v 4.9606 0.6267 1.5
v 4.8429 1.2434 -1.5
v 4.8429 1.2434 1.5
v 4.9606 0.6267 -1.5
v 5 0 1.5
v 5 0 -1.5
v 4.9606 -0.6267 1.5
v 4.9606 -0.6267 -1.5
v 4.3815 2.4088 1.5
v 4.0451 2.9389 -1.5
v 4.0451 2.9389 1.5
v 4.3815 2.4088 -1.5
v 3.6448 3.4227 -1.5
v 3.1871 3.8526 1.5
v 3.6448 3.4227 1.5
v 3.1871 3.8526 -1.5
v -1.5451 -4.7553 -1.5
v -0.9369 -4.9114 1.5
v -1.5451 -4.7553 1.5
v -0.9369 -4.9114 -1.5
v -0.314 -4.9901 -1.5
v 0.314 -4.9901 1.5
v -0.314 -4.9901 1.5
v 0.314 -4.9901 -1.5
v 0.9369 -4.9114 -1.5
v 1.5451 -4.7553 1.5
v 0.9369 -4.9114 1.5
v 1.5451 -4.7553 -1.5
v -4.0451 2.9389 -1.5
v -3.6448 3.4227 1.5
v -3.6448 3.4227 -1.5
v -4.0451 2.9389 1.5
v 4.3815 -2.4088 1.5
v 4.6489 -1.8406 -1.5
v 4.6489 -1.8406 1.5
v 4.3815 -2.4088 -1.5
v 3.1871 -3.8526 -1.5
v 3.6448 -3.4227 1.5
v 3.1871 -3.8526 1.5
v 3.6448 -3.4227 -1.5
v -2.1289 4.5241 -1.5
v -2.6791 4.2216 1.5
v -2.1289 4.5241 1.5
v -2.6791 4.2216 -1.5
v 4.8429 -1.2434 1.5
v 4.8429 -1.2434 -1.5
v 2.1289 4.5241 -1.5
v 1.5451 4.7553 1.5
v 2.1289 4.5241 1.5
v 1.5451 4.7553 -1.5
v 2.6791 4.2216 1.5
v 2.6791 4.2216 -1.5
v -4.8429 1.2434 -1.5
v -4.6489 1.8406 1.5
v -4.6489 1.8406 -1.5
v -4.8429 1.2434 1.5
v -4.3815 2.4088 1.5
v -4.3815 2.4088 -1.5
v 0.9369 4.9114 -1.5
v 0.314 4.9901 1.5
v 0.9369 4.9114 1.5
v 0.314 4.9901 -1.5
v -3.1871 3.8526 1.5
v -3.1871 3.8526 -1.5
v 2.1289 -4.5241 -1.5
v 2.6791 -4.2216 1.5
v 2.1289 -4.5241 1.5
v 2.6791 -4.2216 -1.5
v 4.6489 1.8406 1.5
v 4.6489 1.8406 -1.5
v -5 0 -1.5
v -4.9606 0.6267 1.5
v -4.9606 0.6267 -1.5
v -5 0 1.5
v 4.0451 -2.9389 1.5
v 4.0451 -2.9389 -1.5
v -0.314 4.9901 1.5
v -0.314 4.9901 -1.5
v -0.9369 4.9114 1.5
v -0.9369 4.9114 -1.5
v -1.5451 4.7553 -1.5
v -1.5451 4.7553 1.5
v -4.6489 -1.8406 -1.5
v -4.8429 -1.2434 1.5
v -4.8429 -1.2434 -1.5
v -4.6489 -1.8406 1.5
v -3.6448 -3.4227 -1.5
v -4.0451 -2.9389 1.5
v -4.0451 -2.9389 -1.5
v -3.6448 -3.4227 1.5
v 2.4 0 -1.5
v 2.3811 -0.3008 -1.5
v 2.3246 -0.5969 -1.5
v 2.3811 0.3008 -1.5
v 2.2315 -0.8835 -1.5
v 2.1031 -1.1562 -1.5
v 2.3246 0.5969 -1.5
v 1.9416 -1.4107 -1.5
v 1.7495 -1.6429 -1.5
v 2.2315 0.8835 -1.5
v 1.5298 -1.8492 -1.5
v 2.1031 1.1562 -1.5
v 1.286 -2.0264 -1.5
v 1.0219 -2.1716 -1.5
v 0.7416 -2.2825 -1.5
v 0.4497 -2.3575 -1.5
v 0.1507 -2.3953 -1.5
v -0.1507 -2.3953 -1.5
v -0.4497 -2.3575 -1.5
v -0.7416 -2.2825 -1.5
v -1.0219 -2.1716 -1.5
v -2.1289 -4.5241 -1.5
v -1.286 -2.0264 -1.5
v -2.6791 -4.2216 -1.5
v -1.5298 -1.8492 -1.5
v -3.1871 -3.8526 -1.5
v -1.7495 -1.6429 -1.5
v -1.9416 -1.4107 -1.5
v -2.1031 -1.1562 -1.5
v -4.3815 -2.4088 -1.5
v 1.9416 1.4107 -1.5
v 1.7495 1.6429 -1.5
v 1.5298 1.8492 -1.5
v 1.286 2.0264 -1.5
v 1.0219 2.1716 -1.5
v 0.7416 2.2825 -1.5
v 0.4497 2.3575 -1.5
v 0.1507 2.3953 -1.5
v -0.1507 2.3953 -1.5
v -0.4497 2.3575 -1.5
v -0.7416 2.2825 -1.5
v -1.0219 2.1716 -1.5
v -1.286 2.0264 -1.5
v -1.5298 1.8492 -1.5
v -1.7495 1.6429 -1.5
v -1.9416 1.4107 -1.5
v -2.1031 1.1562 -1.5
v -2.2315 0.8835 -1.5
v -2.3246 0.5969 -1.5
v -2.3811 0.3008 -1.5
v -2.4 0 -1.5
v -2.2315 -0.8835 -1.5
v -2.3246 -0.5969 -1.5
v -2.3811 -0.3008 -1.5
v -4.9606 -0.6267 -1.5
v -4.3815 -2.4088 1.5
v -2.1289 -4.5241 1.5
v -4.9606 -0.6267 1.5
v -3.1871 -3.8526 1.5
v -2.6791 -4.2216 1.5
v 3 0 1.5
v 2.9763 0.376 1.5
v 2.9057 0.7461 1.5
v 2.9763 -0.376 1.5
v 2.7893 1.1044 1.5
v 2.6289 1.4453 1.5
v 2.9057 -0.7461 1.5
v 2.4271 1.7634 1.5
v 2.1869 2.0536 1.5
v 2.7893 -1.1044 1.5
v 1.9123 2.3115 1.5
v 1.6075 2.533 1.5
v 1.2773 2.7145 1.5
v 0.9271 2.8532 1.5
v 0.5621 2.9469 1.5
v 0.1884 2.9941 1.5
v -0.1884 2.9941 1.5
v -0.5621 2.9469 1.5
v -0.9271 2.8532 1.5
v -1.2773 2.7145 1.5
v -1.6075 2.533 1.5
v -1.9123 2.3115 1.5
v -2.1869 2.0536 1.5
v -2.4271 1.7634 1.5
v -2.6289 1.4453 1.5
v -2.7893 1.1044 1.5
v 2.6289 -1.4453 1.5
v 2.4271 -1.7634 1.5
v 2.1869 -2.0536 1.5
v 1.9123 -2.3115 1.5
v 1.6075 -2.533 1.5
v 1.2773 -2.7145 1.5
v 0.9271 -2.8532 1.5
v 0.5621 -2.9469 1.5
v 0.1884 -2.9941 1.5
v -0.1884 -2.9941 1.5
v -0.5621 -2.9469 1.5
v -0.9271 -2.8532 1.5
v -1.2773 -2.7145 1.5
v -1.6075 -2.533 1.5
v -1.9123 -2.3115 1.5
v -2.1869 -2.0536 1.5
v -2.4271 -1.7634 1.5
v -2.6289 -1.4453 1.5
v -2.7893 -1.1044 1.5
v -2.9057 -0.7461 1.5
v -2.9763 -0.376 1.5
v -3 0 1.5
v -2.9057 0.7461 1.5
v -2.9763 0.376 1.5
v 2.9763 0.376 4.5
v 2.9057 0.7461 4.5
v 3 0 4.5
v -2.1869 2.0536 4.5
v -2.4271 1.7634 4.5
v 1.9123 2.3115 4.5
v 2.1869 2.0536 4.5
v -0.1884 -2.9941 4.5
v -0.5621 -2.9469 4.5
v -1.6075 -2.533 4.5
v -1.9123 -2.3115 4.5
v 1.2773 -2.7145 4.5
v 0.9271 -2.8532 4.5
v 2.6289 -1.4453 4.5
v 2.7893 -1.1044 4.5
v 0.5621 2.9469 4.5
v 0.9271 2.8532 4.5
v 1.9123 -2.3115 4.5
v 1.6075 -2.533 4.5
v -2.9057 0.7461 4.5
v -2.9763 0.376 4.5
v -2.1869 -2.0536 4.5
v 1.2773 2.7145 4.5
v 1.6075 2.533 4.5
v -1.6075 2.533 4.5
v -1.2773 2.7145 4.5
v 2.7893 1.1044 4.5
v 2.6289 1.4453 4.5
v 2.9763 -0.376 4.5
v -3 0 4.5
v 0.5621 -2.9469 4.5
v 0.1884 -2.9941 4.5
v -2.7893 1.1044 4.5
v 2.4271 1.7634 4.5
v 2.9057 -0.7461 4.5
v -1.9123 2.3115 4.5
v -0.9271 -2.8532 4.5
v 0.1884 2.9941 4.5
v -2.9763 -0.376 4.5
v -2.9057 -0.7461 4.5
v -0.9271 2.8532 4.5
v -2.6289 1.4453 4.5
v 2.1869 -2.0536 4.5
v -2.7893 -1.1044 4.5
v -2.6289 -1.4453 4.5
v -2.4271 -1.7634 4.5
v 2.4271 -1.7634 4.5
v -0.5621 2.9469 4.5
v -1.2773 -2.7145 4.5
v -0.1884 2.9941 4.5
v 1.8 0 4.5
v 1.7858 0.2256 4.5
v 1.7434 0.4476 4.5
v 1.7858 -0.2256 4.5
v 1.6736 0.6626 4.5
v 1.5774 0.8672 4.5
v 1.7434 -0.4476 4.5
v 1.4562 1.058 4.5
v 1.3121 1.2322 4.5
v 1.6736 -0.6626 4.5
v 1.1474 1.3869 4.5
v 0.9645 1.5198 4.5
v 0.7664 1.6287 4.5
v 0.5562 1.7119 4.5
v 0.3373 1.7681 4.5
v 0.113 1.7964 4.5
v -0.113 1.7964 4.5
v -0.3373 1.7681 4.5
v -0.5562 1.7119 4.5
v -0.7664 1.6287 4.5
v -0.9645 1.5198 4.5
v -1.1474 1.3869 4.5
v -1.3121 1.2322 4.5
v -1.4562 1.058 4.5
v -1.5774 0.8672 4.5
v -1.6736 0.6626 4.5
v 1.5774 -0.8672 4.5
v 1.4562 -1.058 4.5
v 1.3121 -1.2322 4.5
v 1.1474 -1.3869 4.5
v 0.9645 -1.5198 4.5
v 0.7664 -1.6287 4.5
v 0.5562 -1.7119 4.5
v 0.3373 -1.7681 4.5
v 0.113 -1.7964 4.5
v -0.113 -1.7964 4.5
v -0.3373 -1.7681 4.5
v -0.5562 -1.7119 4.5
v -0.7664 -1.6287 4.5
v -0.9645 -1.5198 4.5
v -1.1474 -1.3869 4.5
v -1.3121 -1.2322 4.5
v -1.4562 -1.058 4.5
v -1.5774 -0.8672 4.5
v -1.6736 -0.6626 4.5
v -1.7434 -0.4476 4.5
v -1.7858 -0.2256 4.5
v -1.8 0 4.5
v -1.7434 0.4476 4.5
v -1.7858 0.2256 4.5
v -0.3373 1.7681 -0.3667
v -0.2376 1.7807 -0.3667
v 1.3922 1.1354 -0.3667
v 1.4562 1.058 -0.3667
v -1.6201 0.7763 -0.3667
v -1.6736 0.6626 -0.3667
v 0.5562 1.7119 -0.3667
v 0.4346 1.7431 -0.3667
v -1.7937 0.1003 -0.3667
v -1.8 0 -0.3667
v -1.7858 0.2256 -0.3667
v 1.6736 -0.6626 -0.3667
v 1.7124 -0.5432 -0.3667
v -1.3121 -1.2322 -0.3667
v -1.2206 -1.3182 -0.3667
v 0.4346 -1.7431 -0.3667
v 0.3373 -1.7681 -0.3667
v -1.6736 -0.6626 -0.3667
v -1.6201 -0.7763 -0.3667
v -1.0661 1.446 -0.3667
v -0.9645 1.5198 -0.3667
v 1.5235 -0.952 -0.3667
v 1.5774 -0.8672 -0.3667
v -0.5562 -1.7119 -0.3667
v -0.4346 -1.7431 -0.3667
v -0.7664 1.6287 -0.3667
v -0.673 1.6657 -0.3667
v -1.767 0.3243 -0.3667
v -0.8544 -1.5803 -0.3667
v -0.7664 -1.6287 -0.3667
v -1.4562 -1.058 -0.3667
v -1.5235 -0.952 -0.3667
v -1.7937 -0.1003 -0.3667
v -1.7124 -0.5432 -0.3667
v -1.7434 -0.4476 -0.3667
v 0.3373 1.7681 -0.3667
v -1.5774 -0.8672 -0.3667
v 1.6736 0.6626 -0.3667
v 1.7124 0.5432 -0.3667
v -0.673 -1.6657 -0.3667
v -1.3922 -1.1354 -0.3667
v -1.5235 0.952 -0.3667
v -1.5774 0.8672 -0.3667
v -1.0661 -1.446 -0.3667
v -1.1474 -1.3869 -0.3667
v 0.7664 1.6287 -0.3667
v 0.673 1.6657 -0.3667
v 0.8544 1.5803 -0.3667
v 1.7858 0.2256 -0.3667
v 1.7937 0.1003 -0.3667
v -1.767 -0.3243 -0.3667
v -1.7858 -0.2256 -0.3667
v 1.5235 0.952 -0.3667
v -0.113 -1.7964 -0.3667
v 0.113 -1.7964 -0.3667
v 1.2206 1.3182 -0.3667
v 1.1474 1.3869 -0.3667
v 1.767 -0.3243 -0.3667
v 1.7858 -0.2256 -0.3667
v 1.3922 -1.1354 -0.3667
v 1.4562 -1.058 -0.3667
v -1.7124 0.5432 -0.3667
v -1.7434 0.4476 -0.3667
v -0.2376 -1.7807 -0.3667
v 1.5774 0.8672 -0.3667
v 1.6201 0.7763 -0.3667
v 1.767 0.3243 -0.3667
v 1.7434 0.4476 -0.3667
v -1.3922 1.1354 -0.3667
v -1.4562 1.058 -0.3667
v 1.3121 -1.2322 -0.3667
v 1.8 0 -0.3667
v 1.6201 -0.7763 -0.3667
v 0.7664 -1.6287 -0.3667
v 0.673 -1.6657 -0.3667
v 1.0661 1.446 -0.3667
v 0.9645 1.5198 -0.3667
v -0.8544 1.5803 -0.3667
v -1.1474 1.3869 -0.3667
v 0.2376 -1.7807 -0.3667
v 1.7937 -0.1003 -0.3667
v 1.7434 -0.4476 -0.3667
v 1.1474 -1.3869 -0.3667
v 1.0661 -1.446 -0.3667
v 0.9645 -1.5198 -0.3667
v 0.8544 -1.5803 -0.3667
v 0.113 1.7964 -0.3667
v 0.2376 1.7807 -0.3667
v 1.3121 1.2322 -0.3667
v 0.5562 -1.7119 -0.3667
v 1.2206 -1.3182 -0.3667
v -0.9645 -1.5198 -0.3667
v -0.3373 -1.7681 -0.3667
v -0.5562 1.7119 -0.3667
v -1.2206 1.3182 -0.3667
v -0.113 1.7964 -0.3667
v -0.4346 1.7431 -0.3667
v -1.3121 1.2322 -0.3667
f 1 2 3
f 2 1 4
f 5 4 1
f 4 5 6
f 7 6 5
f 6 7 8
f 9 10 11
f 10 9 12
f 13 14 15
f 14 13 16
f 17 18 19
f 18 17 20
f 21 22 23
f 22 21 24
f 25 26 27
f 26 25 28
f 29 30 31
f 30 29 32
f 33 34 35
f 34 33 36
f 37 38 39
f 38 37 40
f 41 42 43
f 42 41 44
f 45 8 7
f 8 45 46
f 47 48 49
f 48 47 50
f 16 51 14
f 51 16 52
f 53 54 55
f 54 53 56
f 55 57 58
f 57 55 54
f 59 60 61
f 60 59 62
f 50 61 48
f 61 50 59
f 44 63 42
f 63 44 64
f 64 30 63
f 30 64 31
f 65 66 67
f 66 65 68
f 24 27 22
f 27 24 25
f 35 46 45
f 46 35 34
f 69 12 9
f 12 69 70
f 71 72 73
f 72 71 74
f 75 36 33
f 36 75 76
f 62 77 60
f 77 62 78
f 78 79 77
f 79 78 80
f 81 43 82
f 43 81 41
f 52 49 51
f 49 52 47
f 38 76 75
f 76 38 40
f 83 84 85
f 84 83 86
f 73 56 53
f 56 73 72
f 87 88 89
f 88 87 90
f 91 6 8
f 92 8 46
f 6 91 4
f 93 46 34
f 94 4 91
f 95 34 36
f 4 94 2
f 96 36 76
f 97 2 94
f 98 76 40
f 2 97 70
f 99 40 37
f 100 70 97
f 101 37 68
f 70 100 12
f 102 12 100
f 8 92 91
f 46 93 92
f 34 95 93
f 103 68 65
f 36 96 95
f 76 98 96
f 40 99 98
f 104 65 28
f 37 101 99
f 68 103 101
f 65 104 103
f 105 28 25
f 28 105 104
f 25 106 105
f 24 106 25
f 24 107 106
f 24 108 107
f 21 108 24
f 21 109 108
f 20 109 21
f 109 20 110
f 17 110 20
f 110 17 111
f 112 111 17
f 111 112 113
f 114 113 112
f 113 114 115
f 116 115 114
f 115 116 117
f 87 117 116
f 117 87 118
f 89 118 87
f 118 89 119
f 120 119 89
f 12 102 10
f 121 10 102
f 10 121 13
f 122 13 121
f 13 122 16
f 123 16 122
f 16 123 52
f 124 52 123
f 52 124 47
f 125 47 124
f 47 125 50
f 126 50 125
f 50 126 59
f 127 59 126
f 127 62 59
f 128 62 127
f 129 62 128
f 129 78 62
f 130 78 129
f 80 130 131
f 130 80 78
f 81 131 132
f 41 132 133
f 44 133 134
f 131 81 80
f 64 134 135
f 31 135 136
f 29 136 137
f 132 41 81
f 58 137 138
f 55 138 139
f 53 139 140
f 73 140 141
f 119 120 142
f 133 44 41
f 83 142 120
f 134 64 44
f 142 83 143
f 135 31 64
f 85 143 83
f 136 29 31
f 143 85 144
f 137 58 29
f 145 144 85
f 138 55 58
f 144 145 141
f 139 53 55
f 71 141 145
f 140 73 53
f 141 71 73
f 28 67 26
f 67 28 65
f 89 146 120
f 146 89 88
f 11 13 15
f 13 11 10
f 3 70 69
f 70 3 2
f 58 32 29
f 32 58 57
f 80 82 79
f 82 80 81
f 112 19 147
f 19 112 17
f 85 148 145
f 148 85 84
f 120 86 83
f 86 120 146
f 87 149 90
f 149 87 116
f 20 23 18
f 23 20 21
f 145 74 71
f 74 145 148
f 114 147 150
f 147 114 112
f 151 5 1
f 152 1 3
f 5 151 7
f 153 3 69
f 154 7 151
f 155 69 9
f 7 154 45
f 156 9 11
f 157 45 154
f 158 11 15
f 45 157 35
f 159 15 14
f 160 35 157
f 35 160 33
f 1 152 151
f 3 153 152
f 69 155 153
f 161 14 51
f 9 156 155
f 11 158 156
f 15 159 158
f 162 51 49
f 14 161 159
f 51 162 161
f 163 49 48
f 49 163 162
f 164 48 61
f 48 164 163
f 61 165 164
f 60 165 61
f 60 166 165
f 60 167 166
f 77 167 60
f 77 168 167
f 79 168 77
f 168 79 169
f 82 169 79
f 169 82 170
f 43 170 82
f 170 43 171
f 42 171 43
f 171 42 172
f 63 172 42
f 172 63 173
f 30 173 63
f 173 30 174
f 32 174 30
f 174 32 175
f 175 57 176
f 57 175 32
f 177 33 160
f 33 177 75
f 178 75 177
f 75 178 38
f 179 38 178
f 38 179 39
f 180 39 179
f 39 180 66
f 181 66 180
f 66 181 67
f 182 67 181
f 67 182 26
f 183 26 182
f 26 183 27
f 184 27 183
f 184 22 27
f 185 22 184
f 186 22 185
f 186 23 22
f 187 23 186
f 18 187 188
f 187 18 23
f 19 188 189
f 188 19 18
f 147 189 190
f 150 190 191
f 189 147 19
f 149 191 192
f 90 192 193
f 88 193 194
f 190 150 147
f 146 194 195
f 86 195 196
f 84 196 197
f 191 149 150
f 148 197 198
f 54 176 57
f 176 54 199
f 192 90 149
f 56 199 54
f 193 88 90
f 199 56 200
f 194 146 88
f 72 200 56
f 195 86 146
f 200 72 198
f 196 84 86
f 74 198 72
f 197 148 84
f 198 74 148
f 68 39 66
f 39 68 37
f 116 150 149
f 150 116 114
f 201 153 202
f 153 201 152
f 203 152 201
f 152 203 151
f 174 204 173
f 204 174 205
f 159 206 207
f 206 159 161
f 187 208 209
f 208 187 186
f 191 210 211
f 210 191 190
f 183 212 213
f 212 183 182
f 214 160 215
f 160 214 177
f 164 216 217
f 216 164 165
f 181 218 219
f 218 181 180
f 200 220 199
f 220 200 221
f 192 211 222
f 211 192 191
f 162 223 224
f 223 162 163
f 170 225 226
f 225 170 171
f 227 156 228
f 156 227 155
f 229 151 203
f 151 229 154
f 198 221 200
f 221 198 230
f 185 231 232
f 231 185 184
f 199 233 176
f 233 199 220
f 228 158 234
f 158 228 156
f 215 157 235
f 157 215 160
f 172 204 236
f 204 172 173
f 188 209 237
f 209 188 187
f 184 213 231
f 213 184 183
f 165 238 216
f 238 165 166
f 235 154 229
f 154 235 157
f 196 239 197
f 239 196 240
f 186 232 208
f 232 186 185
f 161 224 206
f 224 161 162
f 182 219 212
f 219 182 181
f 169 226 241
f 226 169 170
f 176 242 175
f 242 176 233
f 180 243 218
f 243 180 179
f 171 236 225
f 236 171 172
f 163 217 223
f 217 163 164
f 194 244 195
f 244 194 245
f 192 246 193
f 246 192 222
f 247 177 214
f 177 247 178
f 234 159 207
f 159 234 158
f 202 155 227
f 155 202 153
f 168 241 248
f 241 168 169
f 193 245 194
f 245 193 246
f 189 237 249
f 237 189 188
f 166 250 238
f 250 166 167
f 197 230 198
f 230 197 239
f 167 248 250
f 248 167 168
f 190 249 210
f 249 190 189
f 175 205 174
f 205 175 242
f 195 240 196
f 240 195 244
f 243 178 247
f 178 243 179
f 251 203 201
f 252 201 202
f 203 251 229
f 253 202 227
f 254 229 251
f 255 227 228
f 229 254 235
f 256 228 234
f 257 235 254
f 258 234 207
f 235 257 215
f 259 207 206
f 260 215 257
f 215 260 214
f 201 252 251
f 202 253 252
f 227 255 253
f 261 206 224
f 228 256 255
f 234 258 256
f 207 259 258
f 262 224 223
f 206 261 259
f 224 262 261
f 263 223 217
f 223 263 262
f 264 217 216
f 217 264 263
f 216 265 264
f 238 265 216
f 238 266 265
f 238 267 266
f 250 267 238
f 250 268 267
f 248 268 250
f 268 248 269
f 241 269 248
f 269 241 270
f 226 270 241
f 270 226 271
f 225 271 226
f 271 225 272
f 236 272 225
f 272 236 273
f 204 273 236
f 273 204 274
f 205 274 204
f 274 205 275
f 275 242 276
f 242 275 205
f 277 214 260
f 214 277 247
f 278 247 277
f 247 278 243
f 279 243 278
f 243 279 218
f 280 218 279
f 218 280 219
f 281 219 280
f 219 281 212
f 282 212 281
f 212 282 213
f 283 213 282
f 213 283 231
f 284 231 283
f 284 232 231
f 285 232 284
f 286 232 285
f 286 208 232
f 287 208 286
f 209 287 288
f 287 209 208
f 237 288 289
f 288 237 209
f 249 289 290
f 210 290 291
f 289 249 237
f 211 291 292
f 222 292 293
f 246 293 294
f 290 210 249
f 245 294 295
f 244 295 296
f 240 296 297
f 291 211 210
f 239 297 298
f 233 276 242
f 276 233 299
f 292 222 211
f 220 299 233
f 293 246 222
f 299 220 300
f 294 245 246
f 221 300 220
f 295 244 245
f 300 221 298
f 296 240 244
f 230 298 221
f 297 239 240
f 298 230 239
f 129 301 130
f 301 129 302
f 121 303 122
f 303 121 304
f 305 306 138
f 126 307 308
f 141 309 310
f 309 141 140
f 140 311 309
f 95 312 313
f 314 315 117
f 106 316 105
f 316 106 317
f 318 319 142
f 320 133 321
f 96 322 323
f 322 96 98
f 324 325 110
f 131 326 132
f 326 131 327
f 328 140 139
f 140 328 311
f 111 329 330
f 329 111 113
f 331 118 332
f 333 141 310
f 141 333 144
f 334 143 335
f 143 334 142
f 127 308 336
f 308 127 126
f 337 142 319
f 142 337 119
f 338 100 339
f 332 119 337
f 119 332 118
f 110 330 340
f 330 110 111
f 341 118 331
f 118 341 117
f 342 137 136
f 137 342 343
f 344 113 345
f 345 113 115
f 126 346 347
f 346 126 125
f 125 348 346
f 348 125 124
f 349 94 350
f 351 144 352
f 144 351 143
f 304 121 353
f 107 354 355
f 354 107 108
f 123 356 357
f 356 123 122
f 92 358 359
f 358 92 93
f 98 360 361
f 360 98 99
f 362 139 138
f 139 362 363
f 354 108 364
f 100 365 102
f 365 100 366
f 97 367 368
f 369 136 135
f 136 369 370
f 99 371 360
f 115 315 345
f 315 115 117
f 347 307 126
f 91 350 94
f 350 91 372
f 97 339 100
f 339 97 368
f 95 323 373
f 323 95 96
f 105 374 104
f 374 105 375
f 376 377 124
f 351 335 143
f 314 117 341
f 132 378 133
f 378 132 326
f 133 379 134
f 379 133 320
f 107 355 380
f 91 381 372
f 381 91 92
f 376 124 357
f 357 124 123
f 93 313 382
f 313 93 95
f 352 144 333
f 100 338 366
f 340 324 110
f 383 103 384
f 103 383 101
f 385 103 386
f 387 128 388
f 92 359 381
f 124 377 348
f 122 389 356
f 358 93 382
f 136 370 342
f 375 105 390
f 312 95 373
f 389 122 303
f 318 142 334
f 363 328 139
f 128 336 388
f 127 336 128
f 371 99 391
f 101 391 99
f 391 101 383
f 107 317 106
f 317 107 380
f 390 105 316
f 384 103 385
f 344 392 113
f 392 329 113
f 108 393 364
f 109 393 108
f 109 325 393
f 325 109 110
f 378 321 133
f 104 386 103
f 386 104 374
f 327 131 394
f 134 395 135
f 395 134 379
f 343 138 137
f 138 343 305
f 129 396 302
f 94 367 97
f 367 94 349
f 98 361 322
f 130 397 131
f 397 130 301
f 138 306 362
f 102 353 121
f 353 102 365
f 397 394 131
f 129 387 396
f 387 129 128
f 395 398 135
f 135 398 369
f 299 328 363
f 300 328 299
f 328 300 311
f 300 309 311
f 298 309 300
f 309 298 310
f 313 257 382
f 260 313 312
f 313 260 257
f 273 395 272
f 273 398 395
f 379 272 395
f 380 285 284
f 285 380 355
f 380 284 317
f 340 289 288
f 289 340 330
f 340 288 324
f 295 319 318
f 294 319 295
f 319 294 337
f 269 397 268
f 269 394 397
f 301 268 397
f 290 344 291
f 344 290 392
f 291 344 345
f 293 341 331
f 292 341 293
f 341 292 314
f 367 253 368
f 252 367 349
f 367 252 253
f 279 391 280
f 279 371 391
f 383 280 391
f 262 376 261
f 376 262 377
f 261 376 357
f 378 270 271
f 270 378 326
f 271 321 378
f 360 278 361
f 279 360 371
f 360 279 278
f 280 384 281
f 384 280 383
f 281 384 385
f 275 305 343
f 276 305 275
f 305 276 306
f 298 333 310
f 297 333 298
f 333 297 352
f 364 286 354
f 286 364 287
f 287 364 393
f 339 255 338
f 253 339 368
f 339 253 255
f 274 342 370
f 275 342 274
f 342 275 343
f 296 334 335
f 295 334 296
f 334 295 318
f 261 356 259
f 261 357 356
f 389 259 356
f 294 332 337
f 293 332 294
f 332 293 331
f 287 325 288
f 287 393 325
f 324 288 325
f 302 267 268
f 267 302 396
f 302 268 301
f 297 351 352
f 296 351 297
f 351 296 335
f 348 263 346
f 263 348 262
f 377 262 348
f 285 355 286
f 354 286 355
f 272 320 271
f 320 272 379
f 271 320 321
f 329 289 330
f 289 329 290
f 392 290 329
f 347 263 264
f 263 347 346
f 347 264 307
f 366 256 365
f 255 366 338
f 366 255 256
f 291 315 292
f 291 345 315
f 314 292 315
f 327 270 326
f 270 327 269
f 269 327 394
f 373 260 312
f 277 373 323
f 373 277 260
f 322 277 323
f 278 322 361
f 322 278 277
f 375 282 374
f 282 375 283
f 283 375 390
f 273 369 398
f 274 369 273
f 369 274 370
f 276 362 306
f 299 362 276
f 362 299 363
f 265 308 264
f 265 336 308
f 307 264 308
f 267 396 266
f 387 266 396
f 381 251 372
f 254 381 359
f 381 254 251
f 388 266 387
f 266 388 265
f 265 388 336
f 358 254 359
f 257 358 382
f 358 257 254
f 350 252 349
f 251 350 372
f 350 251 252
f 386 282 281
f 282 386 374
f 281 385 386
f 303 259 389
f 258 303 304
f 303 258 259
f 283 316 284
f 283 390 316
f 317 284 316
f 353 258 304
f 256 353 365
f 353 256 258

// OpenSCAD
$fn = 50;


difference() {
	union() {
		translate(v = [0, 0, -1.5000000000]) {
			cylinder(h = 3, r = 5.0000000000);
		}
		translate(v = [0, 0, -1.5000000000]) {
			cylinder(h = 6, r = 3.0000000000);
		}
	}
	union() {
		translate(v = [0, 0, -1.5000000000]) {
			rotate(a = [0, 180, 0]) {
				difference() {
					union() {
						translate(v = [0, 0, -1.7000000000]) {
							cylinder(h = 1.7000000000, r1 = 1.5000000000, r2 = 2.4000000000);
						}
						translate(v = [0, 0, -6.0000000000]) {
							cylinder(h = 6, r = 1.5000000000);
						}
						translate(v = [0, 0, -6.0000000000]) {
							cylinder(h = 6, r = 1.8000000000);
						}
						translate(v = [0, 0, -6.0000000000]) {
							cylinder(h = 6, r = 1.5000000000);
						}
					}
					union();
				}
			}
		}
		translate(v = [0, 0, -100.0000000000]) {
			cylinder(h = 200, r = 1.5000000000);
		}
	}
}
